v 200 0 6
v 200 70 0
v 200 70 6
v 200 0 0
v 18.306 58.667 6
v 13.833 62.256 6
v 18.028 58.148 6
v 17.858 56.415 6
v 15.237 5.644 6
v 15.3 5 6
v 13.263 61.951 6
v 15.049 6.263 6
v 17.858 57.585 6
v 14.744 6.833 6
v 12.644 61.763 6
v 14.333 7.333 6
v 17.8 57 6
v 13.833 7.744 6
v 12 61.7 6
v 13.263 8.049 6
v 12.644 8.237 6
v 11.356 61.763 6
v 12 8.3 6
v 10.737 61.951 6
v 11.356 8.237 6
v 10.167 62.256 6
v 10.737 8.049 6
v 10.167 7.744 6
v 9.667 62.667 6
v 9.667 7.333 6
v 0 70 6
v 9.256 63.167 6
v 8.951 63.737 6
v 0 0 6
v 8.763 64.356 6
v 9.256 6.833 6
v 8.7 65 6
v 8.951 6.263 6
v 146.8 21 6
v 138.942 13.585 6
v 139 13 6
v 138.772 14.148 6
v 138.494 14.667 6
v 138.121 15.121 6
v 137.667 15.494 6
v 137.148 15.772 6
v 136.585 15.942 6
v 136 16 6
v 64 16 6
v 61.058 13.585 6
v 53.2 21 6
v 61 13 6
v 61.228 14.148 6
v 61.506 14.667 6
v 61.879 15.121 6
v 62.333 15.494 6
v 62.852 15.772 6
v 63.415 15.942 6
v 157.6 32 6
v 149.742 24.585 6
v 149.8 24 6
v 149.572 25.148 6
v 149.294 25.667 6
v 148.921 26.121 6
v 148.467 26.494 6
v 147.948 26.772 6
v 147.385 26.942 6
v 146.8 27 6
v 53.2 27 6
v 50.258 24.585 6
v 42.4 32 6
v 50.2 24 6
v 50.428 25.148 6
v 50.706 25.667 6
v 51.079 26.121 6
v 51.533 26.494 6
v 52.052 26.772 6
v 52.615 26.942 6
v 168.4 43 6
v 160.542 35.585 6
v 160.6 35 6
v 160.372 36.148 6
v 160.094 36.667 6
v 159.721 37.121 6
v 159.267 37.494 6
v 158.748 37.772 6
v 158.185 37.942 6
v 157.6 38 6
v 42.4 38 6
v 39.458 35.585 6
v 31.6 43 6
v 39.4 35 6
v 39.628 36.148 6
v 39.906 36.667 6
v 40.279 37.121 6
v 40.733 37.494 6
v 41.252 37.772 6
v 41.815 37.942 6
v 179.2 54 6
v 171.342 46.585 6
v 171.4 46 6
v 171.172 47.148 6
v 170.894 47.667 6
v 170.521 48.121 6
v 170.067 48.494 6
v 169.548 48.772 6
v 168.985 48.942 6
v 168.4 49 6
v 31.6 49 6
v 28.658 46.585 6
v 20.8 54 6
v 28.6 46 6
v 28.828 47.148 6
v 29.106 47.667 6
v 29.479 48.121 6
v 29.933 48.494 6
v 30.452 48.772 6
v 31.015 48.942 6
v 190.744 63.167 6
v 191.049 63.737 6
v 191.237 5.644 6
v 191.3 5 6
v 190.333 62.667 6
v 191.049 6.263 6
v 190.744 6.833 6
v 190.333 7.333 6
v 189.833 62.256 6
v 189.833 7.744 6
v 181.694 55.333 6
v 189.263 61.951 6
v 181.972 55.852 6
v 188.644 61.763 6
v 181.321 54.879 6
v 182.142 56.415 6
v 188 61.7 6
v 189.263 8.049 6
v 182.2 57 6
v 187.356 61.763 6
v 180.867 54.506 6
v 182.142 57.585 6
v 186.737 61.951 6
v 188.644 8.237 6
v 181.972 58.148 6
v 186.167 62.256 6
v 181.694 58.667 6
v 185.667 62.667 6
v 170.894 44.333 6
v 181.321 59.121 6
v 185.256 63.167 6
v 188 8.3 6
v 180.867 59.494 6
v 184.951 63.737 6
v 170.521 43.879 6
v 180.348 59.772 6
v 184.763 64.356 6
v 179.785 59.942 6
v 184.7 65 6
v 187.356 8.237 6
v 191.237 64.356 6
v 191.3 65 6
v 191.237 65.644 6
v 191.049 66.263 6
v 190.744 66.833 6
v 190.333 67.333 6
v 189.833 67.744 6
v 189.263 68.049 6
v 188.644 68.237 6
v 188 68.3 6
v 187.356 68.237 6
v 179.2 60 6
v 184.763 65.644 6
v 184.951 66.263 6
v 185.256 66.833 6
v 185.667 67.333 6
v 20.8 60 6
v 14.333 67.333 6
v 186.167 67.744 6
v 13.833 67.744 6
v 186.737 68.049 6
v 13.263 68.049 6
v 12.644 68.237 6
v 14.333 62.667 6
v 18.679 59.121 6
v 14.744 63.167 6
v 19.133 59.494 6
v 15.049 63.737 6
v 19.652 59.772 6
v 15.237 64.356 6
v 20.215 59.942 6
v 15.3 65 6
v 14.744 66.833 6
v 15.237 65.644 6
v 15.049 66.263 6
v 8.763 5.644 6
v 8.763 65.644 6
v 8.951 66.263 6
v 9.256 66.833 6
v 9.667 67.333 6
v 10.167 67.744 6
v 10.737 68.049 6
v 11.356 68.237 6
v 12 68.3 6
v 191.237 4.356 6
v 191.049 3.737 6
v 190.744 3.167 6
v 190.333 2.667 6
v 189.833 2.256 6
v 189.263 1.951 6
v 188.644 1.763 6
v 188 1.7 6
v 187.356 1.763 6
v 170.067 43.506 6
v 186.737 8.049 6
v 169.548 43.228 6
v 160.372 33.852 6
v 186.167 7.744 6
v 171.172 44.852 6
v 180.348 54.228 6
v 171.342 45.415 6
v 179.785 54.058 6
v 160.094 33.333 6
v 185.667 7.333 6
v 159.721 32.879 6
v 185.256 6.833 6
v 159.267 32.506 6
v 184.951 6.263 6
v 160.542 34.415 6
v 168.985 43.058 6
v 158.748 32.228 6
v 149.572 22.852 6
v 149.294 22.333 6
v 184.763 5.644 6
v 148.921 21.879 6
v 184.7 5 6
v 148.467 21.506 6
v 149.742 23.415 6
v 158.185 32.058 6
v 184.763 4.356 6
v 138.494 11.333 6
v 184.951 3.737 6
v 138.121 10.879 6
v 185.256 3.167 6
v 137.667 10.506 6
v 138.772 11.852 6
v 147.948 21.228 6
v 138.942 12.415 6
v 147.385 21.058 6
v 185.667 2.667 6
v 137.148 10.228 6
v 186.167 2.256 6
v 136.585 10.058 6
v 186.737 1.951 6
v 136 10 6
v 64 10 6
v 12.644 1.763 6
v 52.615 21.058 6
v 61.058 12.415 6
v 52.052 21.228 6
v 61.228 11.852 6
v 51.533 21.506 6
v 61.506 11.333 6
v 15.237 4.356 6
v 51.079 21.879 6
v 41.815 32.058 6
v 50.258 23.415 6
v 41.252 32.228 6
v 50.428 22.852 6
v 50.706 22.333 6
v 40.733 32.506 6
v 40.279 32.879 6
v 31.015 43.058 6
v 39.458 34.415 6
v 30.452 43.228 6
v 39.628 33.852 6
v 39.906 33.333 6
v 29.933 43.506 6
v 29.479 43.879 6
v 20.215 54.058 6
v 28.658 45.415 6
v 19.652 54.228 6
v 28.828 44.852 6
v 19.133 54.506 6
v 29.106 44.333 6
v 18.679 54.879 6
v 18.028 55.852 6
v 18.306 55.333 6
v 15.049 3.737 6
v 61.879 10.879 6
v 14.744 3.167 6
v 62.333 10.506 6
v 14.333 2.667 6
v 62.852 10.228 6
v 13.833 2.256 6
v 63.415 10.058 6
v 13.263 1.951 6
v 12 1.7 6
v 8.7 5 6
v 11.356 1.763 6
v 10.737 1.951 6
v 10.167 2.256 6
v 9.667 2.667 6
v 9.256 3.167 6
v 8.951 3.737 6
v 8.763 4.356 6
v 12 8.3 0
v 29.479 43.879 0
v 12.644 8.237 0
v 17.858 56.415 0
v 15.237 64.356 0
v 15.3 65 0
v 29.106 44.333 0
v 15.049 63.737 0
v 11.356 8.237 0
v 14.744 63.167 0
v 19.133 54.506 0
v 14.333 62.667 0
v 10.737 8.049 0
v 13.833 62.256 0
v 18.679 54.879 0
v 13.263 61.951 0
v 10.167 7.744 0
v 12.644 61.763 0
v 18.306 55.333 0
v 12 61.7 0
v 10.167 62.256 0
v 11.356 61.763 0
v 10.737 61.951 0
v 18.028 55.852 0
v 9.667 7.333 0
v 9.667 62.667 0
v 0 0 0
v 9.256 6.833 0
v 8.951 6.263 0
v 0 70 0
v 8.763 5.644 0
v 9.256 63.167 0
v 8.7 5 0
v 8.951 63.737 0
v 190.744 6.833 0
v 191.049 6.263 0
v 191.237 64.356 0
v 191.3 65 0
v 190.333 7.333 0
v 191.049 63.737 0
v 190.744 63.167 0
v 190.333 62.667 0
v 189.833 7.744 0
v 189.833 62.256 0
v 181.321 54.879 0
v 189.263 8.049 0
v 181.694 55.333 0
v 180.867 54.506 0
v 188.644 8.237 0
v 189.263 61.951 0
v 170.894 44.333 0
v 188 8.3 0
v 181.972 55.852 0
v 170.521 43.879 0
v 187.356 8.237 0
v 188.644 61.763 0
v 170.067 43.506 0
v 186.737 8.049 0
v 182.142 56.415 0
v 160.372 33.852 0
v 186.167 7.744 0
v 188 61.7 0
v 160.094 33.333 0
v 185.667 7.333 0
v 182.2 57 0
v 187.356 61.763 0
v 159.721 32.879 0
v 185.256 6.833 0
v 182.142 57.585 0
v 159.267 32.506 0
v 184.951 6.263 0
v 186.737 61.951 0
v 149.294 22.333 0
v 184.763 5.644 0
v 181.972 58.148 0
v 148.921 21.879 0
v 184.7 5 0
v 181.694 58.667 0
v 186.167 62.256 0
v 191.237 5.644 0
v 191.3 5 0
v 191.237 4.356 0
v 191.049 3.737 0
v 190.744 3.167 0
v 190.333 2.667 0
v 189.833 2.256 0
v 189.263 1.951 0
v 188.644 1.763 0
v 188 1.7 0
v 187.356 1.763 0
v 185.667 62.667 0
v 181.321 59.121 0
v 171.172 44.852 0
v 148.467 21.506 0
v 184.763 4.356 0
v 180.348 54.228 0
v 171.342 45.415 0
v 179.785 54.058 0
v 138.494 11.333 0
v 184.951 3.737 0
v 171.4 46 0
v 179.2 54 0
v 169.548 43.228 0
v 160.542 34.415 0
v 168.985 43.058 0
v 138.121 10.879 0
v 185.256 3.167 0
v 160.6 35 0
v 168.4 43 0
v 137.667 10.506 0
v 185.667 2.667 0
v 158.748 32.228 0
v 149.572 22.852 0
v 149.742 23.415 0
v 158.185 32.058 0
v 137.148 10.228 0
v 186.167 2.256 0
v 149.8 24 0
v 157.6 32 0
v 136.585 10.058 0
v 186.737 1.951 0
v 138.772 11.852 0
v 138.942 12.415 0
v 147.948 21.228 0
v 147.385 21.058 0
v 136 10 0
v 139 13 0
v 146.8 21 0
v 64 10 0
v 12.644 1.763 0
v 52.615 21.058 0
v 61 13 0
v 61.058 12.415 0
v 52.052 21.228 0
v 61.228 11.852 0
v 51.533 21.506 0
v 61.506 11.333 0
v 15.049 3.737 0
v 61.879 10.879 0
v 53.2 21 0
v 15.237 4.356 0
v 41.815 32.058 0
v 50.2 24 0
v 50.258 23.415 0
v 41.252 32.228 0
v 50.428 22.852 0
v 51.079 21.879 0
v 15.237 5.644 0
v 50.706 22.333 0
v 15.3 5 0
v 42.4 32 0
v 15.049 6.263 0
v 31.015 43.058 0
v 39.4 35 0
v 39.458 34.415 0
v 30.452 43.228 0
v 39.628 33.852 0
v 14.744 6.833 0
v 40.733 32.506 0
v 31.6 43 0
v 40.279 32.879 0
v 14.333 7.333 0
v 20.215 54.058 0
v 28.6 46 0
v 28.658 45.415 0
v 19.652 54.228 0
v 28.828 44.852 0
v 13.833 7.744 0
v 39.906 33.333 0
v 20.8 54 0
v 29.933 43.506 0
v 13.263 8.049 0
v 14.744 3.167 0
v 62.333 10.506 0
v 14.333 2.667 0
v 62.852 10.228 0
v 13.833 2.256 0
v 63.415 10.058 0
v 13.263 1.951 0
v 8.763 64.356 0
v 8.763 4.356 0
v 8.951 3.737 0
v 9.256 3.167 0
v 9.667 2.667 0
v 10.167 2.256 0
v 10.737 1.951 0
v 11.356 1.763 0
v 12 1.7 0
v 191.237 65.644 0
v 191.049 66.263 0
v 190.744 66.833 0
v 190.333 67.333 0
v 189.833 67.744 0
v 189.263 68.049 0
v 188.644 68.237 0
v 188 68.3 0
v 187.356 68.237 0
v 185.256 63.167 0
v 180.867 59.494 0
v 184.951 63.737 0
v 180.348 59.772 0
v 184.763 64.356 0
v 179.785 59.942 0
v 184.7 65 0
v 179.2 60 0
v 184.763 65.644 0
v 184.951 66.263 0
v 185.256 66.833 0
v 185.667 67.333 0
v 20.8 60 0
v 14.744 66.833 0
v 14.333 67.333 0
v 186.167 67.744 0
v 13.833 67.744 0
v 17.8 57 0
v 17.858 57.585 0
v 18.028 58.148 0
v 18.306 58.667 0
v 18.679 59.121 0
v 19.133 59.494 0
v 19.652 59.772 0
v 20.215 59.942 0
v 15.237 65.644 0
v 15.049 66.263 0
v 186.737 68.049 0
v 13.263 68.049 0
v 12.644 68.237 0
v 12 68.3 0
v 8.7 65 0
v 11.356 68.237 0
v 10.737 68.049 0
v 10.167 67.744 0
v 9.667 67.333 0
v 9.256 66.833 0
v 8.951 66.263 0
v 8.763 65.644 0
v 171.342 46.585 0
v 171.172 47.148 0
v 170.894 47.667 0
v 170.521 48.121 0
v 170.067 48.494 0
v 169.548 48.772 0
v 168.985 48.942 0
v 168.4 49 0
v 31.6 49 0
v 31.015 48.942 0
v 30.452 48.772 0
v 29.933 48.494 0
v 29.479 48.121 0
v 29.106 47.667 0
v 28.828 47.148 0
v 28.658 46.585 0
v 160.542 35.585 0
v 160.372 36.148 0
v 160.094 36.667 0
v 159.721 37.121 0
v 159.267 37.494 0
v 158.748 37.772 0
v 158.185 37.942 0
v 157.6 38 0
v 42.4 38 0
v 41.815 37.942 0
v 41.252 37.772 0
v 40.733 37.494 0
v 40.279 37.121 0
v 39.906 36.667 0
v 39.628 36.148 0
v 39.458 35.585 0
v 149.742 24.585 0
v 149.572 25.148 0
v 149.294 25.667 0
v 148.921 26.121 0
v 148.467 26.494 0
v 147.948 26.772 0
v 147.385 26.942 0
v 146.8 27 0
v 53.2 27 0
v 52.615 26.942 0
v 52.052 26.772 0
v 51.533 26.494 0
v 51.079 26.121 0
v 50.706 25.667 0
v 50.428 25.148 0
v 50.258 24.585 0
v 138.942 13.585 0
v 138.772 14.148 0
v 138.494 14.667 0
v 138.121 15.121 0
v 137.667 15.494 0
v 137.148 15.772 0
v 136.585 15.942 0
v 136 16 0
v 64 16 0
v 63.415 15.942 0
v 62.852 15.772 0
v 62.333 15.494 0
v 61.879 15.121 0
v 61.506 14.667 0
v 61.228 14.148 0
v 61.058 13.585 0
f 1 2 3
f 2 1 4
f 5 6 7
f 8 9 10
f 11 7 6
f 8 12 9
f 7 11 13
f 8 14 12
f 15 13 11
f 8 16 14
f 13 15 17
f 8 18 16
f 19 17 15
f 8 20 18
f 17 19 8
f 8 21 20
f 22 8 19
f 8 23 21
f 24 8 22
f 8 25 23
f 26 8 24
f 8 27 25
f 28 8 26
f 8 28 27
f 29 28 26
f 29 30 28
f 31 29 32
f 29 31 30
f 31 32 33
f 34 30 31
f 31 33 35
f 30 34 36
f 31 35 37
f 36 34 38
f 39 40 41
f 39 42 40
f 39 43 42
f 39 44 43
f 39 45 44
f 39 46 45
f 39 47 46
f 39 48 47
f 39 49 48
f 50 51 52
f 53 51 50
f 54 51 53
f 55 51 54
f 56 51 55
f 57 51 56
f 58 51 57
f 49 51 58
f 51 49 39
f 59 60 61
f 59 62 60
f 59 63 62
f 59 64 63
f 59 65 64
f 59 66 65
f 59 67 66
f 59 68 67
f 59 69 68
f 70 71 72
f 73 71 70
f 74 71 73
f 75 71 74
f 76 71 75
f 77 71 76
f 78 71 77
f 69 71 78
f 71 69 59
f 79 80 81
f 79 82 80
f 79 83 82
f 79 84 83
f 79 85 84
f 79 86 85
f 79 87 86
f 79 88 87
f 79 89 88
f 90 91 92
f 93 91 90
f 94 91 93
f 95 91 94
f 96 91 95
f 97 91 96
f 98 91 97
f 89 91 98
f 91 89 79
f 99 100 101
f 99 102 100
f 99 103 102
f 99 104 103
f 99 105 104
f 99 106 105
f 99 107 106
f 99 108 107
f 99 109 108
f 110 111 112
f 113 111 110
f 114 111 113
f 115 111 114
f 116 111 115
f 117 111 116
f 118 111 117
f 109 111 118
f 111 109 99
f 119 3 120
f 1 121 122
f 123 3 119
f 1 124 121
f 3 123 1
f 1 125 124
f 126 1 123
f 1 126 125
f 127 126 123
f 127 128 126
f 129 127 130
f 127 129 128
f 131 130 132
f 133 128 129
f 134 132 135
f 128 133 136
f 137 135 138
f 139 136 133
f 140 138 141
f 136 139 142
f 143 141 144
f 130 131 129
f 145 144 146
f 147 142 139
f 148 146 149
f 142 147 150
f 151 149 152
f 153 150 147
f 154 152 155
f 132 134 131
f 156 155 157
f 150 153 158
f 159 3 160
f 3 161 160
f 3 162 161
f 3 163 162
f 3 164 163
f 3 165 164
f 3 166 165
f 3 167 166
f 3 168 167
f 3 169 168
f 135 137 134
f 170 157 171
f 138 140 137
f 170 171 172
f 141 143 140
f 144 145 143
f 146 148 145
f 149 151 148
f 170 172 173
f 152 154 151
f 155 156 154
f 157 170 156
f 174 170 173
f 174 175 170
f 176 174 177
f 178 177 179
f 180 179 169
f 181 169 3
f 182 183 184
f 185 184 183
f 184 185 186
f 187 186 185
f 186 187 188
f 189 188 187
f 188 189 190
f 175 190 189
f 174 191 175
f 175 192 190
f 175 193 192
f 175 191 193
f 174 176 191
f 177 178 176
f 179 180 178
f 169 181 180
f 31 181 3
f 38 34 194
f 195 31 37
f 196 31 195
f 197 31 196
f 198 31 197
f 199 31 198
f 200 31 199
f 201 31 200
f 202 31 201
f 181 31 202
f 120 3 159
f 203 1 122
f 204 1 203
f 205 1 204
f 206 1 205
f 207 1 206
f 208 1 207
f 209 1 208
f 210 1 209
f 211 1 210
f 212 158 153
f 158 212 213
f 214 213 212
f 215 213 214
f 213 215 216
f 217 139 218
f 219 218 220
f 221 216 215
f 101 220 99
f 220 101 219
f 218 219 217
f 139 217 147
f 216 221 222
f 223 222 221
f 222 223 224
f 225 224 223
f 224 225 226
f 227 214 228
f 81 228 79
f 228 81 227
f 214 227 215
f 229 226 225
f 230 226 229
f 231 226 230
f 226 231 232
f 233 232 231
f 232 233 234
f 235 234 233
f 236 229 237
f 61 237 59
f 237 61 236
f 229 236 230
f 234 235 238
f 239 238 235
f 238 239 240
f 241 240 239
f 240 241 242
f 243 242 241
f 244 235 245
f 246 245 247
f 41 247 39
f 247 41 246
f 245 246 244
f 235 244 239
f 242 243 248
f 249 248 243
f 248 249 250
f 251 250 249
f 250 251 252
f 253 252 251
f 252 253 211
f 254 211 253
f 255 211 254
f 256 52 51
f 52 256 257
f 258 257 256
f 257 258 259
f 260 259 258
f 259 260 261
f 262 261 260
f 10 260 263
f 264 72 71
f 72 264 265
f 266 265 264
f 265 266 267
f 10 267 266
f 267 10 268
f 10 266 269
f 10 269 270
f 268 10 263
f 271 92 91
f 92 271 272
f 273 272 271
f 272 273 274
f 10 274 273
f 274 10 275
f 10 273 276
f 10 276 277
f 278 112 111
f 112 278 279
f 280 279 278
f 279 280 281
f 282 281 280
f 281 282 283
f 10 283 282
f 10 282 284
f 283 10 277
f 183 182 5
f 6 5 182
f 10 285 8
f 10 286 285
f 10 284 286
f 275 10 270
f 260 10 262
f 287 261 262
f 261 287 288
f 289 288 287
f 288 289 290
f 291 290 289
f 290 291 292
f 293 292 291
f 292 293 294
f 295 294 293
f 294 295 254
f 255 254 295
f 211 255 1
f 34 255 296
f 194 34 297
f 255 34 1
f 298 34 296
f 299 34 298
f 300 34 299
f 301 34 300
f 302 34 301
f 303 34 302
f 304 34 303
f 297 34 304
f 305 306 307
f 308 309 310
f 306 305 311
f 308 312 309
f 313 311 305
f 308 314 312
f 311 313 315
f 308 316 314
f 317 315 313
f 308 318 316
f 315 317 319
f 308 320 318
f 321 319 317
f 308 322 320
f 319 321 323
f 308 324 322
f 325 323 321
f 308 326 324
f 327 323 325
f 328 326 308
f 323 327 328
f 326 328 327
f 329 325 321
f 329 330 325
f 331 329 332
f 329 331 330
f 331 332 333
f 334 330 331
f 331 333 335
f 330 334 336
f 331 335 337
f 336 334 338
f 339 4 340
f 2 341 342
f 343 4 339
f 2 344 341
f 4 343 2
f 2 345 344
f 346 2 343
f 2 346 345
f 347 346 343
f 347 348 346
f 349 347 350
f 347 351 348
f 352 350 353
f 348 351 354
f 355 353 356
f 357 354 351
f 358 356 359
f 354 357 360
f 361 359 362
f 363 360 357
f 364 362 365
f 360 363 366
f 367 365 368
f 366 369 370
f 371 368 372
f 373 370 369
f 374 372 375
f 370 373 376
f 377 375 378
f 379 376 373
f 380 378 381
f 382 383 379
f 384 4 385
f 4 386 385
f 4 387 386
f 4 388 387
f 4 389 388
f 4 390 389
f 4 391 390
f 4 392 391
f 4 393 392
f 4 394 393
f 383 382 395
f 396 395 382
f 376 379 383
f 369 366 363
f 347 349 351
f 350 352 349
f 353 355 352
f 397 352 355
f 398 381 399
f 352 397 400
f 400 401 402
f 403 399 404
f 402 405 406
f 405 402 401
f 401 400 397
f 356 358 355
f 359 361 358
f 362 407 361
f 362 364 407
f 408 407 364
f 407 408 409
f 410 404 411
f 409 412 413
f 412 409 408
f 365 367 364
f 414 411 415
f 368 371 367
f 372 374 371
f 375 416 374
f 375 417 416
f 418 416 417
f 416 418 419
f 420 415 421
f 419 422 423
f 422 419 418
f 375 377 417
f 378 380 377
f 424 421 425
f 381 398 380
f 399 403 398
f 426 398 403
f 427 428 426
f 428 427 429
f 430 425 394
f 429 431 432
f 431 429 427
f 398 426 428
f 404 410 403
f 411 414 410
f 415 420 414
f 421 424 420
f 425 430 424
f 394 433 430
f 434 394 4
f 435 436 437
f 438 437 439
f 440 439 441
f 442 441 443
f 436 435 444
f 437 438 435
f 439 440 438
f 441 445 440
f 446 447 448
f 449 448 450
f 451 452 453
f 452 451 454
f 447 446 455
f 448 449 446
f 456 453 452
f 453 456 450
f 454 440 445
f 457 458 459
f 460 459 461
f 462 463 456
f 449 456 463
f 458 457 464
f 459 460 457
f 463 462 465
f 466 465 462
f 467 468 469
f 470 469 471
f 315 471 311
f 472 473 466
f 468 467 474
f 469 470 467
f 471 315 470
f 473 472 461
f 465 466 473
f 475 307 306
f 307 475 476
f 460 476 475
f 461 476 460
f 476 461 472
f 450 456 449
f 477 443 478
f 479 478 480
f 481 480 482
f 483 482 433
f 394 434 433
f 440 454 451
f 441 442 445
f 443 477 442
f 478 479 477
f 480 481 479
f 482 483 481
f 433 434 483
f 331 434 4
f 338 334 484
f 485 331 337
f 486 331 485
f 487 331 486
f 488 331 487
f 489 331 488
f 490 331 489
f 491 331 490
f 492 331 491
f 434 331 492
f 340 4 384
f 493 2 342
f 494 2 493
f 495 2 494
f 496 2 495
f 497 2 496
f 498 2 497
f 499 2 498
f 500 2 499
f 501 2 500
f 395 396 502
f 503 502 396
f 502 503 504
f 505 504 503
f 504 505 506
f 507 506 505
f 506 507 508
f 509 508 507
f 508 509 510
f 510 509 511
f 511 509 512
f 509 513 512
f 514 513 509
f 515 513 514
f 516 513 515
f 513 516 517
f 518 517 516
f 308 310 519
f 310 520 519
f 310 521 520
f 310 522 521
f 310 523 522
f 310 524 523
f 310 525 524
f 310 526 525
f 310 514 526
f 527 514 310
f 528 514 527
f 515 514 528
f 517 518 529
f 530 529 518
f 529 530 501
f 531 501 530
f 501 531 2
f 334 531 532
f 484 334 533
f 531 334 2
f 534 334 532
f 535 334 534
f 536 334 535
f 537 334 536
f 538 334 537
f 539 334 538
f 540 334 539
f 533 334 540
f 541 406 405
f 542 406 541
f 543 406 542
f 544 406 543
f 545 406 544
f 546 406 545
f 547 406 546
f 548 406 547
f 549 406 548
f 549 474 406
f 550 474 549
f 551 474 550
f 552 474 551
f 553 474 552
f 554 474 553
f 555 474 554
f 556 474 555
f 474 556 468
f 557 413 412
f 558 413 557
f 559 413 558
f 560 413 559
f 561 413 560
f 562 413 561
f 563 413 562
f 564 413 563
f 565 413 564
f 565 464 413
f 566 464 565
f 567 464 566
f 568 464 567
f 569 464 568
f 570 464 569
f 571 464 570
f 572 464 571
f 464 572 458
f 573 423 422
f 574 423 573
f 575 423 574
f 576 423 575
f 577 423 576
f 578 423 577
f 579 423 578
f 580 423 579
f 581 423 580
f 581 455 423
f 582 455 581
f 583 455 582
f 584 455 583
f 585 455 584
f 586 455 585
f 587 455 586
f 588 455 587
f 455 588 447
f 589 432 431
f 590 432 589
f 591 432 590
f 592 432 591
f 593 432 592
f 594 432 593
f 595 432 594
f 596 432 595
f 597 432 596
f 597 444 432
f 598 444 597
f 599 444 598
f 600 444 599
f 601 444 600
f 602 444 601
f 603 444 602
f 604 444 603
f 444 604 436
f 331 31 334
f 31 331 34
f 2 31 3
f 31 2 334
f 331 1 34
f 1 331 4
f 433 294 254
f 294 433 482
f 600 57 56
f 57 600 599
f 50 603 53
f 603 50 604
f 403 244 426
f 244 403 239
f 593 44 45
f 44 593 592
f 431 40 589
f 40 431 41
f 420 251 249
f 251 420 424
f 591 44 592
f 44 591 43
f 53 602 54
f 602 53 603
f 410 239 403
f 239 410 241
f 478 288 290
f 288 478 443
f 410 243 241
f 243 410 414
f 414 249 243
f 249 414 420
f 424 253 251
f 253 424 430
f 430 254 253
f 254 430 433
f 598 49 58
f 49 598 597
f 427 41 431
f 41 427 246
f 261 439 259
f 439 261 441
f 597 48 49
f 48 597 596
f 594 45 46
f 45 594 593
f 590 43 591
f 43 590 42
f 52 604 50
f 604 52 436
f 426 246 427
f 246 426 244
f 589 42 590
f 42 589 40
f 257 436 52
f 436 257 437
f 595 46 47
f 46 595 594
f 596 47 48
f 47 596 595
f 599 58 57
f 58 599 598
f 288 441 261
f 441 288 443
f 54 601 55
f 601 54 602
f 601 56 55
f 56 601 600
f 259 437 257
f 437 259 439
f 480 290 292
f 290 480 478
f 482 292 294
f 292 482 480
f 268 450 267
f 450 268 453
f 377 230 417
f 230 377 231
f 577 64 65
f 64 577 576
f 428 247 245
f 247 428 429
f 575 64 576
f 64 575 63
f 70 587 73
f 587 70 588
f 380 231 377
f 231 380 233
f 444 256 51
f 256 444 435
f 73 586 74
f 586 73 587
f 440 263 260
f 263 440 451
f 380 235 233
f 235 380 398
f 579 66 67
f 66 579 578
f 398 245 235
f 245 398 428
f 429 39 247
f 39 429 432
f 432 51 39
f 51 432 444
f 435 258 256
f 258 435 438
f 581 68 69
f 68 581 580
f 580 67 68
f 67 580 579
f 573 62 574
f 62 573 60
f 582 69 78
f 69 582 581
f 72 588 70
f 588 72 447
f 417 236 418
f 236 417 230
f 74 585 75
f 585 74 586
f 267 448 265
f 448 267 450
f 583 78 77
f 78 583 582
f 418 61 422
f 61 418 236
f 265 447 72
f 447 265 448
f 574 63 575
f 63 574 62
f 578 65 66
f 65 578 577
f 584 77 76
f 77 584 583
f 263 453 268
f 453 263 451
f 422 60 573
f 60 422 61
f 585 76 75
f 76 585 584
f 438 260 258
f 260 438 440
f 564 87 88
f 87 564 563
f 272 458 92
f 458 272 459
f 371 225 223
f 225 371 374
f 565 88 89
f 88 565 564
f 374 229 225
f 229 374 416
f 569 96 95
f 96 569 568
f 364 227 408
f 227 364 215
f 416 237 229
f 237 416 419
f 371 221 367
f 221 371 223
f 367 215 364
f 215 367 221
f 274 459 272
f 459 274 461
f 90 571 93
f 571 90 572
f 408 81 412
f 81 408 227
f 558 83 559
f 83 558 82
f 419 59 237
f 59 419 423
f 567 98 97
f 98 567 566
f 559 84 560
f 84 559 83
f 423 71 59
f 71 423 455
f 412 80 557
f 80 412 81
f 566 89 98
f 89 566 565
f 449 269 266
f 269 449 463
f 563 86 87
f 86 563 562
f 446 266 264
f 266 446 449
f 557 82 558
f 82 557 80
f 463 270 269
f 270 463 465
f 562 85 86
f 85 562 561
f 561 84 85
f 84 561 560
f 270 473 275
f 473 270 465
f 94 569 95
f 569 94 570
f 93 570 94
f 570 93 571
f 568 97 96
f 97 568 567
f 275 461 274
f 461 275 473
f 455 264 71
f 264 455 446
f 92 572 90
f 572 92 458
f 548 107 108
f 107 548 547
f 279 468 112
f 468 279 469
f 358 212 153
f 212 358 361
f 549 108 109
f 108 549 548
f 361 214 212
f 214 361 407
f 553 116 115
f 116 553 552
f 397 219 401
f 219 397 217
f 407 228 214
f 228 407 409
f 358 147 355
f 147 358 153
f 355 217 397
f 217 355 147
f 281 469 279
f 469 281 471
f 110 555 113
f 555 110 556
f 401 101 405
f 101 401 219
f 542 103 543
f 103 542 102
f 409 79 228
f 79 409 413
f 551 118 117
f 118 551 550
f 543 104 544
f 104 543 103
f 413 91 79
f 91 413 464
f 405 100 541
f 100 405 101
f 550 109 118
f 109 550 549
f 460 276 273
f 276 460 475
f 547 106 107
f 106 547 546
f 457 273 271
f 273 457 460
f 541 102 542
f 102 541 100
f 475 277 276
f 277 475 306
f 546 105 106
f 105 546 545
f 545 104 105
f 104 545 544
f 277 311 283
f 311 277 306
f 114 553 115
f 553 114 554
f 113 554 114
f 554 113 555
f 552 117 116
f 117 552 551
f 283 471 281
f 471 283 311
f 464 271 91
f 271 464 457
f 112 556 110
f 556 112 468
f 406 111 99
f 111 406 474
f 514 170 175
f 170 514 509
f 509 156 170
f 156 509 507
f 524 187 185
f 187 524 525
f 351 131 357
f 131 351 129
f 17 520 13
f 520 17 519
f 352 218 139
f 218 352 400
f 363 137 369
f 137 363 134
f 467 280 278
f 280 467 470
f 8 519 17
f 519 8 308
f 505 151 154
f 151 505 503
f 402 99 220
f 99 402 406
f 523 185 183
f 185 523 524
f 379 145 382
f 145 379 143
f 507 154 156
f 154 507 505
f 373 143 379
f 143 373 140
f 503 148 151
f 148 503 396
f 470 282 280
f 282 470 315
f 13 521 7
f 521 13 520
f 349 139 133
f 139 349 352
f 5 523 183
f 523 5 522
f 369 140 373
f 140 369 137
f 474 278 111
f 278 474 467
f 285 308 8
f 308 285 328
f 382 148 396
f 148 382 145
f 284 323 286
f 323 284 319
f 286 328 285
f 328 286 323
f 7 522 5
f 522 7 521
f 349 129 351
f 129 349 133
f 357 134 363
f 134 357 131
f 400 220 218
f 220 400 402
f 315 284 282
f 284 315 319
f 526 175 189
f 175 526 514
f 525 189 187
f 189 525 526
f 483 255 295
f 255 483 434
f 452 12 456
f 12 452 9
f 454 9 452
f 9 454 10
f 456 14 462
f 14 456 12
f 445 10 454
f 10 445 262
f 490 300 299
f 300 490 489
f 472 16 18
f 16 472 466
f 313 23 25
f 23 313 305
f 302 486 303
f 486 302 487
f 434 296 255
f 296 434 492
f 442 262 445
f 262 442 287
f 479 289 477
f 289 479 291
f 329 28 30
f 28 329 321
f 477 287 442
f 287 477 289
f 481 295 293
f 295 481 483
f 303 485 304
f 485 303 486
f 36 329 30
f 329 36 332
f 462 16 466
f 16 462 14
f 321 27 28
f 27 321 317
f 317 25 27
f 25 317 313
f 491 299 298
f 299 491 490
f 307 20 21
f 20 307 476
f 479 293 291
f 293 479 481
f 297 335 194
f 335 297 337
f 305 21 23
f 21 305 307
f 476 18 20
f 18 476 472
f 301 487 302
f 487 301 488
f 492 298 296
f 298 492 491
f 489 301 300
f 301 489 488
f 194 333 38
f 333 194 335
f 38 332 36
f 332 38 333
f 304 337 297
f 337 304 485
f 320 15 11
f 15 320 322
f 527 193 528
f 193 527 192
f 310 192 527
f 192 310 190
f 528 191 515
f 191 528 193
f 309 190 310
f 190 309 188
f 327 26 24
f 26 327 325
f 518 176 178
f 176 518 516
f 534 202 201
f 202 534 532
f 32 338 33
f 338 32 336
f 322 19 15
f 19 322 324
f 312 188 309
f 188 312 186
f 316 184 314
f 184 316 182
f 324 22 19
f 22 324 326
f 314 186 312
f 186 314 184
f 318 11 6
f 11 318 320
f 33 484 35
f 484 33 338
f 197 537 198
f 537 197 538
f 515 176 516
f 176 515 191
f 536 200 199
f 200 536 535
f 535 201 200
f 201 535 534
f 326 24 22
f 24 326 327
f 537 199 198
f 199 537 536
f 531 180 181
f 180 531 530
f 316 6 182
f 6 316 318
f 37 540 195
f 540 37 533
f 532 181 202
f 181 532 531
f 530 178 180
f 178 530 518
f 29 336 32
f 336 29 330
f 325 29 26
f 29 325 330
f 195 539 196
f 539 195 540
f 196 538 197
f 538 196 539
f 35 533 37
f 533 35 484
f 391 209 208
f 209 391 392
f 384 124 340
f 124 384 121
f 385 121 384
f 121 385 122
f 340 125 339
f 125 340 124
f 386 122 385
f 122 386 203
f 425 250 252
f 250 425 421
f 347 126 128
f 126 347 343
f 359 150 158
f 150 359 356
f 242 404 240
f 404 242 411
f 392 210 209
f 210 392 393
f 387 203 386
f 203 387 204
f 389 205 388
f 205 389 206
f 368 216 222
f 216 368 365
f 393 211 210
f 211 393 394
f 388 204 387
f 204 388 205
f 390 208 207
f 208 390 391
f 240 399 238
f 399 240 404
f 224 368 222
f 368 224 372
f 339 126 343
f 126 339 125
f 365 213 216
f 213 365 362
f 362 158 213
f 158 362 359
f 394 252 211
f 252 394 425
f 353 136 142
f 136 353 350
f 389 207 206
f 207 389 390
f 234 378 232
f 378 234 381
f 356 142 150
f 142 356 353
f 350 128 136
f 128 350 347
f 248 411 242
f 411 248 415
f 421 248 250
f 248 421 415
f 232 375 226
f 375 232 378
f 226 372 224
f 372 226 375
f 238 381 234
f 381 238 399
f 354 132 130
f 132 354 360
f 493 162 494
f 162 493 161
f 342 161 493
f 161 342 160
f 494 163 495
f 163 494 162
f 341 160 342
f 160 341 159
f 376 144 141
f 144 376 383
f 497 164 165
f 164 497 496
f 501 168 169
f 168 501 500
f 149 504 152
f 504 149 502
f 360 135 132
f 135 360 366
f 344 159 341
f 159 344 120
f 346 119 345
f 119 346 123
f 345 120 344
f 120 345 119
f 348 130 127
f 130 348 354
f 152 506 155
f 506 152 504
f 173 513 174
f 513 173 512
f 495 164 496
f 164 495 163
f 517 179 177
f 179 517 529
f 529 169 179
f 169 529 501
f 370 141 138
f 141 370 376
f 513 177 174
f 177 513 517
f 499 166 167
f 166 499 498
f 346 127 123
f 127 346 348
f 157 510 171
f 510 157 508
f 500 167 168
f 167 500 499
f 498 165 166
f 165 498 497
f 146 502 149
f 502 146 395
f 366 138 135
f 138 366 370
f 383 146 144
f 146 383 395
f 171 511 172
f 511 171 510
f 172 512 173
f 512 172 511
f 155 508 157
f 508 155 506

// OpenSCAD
$fn = 32;

// ----------------------------------------------------------------------
// Slotted panel: 200 x 70 mm, 5 рядов of slots
// ----------------------------------------------------------------------

// --- parameters (mm) ---
panel_w = 200;            // panel width
panel_d = 70;             // panel depth
thick = 6;                // panel thickness
slot_w = 6;               // slot width
pitch0 = 11;              // first row pitch
pitch_step = 2.4;         // pitch increase per row
margin = 10;              // margin around the slot field
rows = 5;                 // number of slot rows
mount_d = 6.6;            // mounting holes
mount_x = 88;             // mounting hole offset

difference() {
  union() {
    cube([panel_w, panel_d, thick]);
  }
  /* slot rows: stadium shaped cutters, 2.5 mm clear of both faces */
  /* row 0: pitch 11, length 72 */
  hull() {
    translate([64, 13, -2.5]) cylinder(h = thick + 5, d = slot_w);
    translate([136, 13, -2.5]) cylinder(h = thick + 5, d = slot_w);
  }
  /* row 1: pitch 11, length 93.6 */
  hull() {
    translate([53.2, 24, -2.5]) cylinder(h = thick + 5, d = slot_w);
    translate([146.8, 24, -2.5]) cylinder(h = thick + 5, d = slot_w);
  }
  /* row 2: pitch 11, length 115.2 */
  hull() {
    translate([42.4, 35, -2.5]) cylinder(h = thick + 5, d = slot_w);
    translate([157.6, 35, -2.5]) cylinder(h = thick + 5, d = slot_w);
  }
  /* row 3: pitch 11, length 136.8 */
  hull() {
    translate([31.6, 46, -2.5]) cylinder(h = thick + 5, d = slot_w);
    translate([168.4, 46, -2.5]) cylinder(h = thick + 5, d = slot_w);
  }
  /* row 4: pitch 11, length 158.4 */
  hull() {
    translate([20.8, 57, -2.5]) cylinder(h = thick + 5, d = slot_w);
    translate([179.2, 57, -2.5]) cylinder(h = thick + 5, d = slot_w);
  }
  translate([12, 5, -2.5]) cylinder(h = 11, d = mount_d);
  translate([12, 65, -2.5]) cylinder(h = 11, d = mount_d);
  translate([188, 5, -2.5]) cylinder(h = 11, d = mount_d);
  translate([188, 65, -2.5]) cylinder(h = 11, d = mount_d);
}
